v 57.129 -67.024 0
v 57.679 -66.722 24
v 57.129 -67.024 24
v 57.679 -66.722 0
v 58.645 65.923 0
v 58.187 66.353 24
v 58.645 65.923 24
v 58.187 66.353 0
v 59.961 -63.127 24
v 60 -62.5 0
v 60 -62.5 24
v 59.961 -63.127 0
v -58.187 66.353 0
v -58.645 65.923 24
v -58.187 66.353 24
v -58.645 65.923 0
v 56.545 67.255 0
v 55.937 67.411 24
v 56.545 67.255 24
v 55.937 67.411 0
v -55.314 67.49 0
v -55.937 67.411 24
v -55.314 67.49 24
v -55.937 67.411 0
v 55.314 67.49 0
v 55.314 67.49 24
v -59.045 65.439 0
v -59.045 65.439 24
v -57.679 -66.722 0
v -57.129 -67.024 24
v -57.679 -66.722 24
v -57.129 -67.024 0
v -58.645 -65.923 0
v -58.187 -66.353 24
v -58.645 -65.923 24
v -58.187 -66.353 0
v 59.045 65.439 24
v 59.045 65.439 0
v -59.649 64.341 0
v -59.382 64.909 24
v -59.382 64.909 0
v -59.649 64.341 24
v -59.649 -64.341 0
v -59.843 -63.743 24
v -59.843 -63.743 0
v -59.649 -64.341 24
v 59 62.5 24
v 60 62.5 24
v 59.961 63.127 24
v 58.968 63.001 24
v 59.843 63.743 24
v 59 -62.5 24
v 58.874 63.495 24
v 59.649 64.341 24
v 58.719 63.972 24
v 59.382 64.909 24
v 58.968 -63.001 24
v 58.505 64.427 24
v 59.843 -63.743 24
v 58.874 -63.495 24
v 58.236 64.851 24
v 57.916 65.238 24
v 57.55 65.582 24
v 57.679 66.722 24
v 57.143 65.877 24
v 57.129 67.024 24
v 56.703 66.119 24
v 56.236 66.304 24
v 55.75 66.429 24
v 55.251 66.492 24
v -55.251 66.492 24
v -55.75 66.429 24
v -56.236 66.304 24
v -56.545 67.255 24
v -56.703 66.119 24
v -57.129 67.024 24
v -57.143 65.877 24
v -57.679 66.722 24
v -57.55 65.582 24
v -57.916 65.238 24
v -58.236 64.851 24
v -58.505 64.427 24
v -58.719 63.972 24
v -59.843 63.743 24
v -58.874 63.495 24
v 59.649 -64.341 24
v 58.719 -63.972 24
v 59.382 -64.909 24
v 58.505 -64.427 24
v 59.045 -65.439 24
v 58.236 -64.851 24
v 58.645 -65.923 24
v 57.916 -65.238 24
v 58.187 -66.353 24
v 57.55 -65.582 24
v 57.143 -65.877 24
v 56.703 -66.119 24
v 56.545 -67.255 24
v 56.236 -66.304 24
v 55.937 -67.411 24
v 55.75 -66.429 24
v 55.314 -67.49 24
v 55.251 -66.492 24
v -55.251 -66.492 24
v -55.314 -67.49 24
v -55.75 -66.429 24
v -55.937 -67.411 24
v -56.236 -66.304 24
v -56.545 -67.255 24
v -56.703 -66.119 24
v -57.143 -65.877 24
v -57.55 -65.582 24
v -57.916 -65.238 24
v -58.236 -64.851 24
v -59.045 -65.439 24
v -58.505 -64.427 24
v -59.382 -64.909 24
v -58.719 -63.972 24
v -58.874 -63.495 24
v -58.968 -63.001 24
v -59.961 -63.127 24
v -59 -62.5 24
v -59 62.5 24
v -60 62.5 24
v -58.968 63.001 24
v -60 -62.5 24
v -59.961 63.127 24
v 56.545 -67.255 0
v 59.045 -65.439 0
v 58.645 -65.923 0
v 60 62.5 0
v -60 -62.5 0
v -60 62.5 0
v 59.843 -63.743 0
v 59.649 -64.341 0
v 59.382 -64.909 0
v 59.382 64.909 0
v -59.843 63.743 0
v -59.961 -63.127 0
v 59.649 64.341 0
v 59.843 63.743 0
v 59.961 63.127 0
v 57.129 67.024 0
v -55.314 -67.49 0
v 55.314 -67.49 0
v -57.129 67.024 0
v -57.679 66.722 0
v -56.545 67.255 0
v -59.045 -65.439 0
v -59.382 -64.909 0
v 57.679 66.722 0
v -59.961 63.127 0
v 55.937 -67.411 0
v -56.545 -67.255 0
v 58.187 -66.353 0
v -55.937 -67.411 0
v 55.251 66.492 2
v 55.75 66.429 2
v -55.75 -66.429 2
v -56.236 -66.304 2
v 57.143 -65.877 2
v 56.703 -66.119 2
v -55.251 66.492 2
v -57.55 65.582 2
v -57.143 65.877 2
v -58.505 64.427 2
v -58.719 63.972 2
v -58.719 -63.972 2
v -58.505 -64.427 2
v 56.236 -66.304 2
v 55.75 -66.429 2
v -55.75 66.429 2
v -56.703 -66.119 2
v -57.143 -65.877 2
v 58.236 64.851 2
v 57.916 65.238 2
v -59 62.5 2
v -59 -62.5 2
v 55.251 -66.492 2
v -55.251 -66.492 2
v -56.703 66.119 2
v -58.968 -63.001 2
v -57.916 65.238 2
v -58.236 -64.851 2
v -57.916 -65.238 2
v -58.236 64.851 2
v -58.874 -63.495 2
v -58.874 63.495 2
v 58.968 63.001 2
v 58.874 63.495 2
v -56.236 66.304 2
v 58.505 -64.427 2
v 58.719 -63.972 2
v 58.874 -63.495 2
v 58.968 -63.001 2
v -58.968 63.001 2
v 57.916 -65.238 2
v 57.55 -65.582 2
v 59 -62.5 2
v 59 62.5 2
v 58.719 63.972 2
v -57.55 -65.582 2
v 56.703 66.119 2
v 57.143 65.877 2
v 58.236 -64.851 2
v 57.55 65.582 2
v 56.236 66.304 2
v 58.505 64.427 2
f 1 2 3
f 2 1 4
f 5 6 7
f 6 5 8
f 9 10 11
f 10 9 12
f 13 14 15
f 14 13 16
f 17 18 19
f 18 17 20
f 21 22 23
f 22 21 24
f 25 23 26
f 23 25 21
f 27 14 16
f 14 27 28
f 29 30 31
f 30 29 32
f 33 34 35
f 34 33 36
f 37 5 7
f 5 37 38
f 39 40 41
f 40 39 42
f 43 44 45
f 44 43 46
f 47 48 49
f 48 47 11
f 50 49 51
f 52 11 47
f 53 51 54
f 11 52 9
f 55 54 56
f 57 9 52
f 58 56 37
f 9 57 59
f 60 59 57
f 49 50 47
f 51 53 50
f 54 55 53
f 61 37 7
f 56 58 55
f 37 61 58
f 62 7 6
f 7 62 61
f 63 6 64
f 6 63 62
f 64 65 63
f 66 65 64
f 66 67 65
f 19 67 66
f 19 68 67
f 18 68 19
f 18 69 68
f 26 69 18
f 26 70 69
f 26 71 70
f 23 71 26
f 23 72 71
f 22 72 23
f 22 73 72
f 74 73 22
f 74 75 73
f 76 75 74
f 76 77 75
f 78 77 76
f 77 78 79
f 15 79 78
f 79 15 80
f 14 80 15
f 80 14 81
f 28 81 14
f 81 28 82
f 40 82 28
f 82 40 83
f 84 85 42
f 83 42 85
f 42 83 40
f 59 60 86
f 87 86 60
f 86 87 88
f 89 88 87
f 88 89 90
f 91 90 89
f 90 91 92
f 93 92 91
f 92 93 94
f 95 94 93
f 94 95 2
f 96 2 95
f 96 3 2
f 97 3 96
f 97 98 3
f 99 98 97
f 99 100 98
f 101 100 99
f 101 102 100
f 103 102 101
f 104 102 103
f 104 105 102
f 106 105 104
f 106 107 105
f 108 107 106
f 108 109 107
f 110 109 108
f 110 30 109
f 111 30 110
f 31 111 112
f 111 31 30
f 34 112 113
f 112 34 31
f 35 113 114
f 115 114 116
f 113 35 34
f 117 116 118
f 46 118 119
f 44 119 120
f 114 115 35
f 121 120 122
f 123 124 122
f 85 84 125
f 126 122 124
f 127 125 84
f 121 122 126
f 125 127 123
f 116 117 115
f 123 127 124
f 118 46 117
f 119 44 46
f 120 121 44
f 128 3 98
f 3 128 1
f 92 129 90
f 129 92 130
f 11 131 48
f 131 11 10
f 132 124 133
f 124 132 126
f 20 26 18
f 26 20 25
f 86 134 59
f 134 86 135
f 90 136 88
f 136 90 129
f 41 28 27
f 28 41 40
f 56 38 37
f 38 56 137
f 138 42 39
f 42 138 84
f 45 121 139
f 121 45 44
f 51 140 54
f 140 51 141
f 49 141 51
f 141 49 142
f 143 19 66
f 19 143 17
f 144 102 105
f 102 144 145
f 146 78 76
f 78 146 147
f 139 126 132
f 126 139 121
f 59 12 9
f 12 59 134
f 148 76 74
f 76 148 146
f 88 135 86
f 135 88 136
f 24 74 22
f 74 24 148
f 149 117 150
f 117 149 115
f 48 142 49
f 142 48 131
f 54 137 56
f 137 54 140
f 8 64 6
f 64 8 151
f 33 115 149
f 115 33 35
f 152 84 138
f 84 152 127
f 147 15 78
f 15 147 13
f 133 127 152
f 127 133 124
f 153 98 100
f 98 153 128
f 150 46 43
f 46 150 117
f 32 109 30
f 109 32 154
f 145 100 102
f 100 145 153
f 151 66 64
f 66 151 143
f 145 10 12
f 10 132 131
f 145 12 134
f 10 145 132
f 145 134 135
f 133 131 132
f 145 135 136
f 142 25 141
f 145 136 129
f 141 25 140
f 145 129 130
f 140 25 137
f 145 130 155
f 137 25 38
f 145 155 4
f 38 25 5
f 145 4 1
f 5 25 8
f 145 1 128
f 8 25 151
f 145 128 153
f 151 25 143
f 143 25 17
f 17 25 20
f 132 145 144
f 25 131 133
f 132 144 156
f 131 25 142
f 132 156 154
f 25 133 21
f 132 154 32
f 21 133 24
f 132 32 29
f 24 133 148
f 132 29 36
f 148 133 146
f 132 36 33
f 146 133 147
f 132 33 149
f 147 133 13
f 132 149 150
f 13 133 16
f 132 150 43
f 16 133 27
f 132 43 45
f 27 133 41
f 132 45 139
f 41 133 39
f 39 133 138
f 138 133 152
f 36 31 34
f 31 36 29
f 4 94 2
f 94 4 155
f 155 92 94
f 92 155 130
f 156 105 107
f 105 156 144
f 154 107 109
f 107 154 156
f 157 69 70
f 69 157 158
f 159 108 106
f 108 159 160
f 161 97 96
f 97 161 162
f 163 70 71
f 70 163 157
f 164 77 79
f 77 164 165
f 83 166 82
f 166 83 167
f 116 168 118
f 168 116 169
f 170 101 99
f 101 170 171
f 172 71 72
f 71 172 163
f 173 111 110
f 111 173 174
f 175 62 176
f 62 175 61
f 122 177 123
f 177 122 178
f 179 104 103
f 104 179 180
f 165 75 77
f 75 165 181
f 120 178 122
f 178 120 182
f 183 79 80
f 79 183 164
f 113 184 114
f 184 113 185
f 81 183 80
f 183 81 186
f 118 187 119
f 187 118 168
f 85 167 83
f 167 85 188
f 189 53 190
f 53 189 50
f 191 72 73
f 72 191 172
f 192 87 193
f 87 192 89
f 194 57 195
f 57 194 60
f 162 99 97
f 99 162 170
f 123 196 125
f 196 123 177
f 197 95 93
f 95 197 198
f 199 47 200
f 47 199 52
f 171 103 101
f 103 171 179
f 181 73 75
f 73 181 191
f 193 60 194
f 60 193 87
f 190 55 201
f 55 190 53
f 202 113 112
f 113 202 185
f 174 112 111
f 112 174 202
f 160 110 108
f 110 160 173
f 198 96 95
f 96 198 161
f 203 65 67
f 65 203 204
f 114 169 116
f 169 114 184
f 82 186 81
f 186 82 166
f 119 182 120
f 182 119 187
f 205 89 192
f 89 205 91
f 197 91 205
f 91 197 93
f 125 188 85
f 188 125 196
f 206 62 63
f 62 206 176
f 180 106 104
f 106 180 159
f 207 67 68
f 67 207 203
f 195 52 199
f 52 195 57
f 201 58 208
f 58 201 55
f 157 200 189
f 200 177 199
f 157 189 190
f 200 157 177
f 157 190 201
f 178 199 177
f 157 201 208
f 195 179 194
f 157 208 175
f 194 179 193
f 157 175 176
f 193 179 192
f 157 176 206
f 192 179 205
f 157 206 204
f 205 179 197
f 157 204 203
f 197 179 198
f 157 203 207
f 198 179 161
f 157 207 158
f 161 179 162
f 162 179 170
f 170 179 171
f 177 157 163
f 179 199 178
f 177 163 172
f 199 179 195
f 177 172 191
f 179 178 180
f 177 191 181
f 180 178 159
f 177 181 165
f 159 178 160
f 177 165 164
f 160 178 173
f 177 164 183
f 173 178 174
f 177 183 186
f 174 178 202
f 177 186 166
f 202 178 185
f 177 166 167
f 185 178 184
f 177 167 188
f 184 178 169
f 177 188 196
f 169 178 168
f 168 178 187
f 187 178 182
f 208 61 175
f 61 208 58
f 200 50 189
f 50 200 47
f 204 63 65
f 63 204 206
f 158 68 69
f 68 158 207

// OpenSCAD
$fn = 50;


difference() {
	union() {
		hull() {
			translate(v = [-55.0000000000, 62.5000000000, 0]) {
				cylinder(h = 24, r = 5);
			}
			translate(v = [55.0000000000, 62.5000000000, 0]) {
				cylinder(h = 24, r = 5);
			}
			translate(v = [-55.0000000000, -62.5000000000, 0]) {
				cylinder(h = 24, r = 5);
			}
			translate(v = [55.0000000000, -62.5000000000, 0]) {
				cylinder(h = 24, r = 5);
			}
		}
	}
	union() {
		translate(v = [0, 0, 2]) {
			hull() {
				translate(v = [-55.0000000000, 62.5000000000, 0]) {
					cylinder(h = 22, r = 4);
				}
				translate(v = [55.0000000000, 62.5000000000, 0]) {
					cylinder(h = 22, r = 4);
				}
				translate(v = [-55.0000000000, -62.5000000000, 0]) {
					cylinder(h = 22, r = 4);
				}
				translate(v = [55.0000000000, -62.5000000000, 0]) {
					cylinder(h = 22, r = 4);
				}
			}
		}
	}
}
